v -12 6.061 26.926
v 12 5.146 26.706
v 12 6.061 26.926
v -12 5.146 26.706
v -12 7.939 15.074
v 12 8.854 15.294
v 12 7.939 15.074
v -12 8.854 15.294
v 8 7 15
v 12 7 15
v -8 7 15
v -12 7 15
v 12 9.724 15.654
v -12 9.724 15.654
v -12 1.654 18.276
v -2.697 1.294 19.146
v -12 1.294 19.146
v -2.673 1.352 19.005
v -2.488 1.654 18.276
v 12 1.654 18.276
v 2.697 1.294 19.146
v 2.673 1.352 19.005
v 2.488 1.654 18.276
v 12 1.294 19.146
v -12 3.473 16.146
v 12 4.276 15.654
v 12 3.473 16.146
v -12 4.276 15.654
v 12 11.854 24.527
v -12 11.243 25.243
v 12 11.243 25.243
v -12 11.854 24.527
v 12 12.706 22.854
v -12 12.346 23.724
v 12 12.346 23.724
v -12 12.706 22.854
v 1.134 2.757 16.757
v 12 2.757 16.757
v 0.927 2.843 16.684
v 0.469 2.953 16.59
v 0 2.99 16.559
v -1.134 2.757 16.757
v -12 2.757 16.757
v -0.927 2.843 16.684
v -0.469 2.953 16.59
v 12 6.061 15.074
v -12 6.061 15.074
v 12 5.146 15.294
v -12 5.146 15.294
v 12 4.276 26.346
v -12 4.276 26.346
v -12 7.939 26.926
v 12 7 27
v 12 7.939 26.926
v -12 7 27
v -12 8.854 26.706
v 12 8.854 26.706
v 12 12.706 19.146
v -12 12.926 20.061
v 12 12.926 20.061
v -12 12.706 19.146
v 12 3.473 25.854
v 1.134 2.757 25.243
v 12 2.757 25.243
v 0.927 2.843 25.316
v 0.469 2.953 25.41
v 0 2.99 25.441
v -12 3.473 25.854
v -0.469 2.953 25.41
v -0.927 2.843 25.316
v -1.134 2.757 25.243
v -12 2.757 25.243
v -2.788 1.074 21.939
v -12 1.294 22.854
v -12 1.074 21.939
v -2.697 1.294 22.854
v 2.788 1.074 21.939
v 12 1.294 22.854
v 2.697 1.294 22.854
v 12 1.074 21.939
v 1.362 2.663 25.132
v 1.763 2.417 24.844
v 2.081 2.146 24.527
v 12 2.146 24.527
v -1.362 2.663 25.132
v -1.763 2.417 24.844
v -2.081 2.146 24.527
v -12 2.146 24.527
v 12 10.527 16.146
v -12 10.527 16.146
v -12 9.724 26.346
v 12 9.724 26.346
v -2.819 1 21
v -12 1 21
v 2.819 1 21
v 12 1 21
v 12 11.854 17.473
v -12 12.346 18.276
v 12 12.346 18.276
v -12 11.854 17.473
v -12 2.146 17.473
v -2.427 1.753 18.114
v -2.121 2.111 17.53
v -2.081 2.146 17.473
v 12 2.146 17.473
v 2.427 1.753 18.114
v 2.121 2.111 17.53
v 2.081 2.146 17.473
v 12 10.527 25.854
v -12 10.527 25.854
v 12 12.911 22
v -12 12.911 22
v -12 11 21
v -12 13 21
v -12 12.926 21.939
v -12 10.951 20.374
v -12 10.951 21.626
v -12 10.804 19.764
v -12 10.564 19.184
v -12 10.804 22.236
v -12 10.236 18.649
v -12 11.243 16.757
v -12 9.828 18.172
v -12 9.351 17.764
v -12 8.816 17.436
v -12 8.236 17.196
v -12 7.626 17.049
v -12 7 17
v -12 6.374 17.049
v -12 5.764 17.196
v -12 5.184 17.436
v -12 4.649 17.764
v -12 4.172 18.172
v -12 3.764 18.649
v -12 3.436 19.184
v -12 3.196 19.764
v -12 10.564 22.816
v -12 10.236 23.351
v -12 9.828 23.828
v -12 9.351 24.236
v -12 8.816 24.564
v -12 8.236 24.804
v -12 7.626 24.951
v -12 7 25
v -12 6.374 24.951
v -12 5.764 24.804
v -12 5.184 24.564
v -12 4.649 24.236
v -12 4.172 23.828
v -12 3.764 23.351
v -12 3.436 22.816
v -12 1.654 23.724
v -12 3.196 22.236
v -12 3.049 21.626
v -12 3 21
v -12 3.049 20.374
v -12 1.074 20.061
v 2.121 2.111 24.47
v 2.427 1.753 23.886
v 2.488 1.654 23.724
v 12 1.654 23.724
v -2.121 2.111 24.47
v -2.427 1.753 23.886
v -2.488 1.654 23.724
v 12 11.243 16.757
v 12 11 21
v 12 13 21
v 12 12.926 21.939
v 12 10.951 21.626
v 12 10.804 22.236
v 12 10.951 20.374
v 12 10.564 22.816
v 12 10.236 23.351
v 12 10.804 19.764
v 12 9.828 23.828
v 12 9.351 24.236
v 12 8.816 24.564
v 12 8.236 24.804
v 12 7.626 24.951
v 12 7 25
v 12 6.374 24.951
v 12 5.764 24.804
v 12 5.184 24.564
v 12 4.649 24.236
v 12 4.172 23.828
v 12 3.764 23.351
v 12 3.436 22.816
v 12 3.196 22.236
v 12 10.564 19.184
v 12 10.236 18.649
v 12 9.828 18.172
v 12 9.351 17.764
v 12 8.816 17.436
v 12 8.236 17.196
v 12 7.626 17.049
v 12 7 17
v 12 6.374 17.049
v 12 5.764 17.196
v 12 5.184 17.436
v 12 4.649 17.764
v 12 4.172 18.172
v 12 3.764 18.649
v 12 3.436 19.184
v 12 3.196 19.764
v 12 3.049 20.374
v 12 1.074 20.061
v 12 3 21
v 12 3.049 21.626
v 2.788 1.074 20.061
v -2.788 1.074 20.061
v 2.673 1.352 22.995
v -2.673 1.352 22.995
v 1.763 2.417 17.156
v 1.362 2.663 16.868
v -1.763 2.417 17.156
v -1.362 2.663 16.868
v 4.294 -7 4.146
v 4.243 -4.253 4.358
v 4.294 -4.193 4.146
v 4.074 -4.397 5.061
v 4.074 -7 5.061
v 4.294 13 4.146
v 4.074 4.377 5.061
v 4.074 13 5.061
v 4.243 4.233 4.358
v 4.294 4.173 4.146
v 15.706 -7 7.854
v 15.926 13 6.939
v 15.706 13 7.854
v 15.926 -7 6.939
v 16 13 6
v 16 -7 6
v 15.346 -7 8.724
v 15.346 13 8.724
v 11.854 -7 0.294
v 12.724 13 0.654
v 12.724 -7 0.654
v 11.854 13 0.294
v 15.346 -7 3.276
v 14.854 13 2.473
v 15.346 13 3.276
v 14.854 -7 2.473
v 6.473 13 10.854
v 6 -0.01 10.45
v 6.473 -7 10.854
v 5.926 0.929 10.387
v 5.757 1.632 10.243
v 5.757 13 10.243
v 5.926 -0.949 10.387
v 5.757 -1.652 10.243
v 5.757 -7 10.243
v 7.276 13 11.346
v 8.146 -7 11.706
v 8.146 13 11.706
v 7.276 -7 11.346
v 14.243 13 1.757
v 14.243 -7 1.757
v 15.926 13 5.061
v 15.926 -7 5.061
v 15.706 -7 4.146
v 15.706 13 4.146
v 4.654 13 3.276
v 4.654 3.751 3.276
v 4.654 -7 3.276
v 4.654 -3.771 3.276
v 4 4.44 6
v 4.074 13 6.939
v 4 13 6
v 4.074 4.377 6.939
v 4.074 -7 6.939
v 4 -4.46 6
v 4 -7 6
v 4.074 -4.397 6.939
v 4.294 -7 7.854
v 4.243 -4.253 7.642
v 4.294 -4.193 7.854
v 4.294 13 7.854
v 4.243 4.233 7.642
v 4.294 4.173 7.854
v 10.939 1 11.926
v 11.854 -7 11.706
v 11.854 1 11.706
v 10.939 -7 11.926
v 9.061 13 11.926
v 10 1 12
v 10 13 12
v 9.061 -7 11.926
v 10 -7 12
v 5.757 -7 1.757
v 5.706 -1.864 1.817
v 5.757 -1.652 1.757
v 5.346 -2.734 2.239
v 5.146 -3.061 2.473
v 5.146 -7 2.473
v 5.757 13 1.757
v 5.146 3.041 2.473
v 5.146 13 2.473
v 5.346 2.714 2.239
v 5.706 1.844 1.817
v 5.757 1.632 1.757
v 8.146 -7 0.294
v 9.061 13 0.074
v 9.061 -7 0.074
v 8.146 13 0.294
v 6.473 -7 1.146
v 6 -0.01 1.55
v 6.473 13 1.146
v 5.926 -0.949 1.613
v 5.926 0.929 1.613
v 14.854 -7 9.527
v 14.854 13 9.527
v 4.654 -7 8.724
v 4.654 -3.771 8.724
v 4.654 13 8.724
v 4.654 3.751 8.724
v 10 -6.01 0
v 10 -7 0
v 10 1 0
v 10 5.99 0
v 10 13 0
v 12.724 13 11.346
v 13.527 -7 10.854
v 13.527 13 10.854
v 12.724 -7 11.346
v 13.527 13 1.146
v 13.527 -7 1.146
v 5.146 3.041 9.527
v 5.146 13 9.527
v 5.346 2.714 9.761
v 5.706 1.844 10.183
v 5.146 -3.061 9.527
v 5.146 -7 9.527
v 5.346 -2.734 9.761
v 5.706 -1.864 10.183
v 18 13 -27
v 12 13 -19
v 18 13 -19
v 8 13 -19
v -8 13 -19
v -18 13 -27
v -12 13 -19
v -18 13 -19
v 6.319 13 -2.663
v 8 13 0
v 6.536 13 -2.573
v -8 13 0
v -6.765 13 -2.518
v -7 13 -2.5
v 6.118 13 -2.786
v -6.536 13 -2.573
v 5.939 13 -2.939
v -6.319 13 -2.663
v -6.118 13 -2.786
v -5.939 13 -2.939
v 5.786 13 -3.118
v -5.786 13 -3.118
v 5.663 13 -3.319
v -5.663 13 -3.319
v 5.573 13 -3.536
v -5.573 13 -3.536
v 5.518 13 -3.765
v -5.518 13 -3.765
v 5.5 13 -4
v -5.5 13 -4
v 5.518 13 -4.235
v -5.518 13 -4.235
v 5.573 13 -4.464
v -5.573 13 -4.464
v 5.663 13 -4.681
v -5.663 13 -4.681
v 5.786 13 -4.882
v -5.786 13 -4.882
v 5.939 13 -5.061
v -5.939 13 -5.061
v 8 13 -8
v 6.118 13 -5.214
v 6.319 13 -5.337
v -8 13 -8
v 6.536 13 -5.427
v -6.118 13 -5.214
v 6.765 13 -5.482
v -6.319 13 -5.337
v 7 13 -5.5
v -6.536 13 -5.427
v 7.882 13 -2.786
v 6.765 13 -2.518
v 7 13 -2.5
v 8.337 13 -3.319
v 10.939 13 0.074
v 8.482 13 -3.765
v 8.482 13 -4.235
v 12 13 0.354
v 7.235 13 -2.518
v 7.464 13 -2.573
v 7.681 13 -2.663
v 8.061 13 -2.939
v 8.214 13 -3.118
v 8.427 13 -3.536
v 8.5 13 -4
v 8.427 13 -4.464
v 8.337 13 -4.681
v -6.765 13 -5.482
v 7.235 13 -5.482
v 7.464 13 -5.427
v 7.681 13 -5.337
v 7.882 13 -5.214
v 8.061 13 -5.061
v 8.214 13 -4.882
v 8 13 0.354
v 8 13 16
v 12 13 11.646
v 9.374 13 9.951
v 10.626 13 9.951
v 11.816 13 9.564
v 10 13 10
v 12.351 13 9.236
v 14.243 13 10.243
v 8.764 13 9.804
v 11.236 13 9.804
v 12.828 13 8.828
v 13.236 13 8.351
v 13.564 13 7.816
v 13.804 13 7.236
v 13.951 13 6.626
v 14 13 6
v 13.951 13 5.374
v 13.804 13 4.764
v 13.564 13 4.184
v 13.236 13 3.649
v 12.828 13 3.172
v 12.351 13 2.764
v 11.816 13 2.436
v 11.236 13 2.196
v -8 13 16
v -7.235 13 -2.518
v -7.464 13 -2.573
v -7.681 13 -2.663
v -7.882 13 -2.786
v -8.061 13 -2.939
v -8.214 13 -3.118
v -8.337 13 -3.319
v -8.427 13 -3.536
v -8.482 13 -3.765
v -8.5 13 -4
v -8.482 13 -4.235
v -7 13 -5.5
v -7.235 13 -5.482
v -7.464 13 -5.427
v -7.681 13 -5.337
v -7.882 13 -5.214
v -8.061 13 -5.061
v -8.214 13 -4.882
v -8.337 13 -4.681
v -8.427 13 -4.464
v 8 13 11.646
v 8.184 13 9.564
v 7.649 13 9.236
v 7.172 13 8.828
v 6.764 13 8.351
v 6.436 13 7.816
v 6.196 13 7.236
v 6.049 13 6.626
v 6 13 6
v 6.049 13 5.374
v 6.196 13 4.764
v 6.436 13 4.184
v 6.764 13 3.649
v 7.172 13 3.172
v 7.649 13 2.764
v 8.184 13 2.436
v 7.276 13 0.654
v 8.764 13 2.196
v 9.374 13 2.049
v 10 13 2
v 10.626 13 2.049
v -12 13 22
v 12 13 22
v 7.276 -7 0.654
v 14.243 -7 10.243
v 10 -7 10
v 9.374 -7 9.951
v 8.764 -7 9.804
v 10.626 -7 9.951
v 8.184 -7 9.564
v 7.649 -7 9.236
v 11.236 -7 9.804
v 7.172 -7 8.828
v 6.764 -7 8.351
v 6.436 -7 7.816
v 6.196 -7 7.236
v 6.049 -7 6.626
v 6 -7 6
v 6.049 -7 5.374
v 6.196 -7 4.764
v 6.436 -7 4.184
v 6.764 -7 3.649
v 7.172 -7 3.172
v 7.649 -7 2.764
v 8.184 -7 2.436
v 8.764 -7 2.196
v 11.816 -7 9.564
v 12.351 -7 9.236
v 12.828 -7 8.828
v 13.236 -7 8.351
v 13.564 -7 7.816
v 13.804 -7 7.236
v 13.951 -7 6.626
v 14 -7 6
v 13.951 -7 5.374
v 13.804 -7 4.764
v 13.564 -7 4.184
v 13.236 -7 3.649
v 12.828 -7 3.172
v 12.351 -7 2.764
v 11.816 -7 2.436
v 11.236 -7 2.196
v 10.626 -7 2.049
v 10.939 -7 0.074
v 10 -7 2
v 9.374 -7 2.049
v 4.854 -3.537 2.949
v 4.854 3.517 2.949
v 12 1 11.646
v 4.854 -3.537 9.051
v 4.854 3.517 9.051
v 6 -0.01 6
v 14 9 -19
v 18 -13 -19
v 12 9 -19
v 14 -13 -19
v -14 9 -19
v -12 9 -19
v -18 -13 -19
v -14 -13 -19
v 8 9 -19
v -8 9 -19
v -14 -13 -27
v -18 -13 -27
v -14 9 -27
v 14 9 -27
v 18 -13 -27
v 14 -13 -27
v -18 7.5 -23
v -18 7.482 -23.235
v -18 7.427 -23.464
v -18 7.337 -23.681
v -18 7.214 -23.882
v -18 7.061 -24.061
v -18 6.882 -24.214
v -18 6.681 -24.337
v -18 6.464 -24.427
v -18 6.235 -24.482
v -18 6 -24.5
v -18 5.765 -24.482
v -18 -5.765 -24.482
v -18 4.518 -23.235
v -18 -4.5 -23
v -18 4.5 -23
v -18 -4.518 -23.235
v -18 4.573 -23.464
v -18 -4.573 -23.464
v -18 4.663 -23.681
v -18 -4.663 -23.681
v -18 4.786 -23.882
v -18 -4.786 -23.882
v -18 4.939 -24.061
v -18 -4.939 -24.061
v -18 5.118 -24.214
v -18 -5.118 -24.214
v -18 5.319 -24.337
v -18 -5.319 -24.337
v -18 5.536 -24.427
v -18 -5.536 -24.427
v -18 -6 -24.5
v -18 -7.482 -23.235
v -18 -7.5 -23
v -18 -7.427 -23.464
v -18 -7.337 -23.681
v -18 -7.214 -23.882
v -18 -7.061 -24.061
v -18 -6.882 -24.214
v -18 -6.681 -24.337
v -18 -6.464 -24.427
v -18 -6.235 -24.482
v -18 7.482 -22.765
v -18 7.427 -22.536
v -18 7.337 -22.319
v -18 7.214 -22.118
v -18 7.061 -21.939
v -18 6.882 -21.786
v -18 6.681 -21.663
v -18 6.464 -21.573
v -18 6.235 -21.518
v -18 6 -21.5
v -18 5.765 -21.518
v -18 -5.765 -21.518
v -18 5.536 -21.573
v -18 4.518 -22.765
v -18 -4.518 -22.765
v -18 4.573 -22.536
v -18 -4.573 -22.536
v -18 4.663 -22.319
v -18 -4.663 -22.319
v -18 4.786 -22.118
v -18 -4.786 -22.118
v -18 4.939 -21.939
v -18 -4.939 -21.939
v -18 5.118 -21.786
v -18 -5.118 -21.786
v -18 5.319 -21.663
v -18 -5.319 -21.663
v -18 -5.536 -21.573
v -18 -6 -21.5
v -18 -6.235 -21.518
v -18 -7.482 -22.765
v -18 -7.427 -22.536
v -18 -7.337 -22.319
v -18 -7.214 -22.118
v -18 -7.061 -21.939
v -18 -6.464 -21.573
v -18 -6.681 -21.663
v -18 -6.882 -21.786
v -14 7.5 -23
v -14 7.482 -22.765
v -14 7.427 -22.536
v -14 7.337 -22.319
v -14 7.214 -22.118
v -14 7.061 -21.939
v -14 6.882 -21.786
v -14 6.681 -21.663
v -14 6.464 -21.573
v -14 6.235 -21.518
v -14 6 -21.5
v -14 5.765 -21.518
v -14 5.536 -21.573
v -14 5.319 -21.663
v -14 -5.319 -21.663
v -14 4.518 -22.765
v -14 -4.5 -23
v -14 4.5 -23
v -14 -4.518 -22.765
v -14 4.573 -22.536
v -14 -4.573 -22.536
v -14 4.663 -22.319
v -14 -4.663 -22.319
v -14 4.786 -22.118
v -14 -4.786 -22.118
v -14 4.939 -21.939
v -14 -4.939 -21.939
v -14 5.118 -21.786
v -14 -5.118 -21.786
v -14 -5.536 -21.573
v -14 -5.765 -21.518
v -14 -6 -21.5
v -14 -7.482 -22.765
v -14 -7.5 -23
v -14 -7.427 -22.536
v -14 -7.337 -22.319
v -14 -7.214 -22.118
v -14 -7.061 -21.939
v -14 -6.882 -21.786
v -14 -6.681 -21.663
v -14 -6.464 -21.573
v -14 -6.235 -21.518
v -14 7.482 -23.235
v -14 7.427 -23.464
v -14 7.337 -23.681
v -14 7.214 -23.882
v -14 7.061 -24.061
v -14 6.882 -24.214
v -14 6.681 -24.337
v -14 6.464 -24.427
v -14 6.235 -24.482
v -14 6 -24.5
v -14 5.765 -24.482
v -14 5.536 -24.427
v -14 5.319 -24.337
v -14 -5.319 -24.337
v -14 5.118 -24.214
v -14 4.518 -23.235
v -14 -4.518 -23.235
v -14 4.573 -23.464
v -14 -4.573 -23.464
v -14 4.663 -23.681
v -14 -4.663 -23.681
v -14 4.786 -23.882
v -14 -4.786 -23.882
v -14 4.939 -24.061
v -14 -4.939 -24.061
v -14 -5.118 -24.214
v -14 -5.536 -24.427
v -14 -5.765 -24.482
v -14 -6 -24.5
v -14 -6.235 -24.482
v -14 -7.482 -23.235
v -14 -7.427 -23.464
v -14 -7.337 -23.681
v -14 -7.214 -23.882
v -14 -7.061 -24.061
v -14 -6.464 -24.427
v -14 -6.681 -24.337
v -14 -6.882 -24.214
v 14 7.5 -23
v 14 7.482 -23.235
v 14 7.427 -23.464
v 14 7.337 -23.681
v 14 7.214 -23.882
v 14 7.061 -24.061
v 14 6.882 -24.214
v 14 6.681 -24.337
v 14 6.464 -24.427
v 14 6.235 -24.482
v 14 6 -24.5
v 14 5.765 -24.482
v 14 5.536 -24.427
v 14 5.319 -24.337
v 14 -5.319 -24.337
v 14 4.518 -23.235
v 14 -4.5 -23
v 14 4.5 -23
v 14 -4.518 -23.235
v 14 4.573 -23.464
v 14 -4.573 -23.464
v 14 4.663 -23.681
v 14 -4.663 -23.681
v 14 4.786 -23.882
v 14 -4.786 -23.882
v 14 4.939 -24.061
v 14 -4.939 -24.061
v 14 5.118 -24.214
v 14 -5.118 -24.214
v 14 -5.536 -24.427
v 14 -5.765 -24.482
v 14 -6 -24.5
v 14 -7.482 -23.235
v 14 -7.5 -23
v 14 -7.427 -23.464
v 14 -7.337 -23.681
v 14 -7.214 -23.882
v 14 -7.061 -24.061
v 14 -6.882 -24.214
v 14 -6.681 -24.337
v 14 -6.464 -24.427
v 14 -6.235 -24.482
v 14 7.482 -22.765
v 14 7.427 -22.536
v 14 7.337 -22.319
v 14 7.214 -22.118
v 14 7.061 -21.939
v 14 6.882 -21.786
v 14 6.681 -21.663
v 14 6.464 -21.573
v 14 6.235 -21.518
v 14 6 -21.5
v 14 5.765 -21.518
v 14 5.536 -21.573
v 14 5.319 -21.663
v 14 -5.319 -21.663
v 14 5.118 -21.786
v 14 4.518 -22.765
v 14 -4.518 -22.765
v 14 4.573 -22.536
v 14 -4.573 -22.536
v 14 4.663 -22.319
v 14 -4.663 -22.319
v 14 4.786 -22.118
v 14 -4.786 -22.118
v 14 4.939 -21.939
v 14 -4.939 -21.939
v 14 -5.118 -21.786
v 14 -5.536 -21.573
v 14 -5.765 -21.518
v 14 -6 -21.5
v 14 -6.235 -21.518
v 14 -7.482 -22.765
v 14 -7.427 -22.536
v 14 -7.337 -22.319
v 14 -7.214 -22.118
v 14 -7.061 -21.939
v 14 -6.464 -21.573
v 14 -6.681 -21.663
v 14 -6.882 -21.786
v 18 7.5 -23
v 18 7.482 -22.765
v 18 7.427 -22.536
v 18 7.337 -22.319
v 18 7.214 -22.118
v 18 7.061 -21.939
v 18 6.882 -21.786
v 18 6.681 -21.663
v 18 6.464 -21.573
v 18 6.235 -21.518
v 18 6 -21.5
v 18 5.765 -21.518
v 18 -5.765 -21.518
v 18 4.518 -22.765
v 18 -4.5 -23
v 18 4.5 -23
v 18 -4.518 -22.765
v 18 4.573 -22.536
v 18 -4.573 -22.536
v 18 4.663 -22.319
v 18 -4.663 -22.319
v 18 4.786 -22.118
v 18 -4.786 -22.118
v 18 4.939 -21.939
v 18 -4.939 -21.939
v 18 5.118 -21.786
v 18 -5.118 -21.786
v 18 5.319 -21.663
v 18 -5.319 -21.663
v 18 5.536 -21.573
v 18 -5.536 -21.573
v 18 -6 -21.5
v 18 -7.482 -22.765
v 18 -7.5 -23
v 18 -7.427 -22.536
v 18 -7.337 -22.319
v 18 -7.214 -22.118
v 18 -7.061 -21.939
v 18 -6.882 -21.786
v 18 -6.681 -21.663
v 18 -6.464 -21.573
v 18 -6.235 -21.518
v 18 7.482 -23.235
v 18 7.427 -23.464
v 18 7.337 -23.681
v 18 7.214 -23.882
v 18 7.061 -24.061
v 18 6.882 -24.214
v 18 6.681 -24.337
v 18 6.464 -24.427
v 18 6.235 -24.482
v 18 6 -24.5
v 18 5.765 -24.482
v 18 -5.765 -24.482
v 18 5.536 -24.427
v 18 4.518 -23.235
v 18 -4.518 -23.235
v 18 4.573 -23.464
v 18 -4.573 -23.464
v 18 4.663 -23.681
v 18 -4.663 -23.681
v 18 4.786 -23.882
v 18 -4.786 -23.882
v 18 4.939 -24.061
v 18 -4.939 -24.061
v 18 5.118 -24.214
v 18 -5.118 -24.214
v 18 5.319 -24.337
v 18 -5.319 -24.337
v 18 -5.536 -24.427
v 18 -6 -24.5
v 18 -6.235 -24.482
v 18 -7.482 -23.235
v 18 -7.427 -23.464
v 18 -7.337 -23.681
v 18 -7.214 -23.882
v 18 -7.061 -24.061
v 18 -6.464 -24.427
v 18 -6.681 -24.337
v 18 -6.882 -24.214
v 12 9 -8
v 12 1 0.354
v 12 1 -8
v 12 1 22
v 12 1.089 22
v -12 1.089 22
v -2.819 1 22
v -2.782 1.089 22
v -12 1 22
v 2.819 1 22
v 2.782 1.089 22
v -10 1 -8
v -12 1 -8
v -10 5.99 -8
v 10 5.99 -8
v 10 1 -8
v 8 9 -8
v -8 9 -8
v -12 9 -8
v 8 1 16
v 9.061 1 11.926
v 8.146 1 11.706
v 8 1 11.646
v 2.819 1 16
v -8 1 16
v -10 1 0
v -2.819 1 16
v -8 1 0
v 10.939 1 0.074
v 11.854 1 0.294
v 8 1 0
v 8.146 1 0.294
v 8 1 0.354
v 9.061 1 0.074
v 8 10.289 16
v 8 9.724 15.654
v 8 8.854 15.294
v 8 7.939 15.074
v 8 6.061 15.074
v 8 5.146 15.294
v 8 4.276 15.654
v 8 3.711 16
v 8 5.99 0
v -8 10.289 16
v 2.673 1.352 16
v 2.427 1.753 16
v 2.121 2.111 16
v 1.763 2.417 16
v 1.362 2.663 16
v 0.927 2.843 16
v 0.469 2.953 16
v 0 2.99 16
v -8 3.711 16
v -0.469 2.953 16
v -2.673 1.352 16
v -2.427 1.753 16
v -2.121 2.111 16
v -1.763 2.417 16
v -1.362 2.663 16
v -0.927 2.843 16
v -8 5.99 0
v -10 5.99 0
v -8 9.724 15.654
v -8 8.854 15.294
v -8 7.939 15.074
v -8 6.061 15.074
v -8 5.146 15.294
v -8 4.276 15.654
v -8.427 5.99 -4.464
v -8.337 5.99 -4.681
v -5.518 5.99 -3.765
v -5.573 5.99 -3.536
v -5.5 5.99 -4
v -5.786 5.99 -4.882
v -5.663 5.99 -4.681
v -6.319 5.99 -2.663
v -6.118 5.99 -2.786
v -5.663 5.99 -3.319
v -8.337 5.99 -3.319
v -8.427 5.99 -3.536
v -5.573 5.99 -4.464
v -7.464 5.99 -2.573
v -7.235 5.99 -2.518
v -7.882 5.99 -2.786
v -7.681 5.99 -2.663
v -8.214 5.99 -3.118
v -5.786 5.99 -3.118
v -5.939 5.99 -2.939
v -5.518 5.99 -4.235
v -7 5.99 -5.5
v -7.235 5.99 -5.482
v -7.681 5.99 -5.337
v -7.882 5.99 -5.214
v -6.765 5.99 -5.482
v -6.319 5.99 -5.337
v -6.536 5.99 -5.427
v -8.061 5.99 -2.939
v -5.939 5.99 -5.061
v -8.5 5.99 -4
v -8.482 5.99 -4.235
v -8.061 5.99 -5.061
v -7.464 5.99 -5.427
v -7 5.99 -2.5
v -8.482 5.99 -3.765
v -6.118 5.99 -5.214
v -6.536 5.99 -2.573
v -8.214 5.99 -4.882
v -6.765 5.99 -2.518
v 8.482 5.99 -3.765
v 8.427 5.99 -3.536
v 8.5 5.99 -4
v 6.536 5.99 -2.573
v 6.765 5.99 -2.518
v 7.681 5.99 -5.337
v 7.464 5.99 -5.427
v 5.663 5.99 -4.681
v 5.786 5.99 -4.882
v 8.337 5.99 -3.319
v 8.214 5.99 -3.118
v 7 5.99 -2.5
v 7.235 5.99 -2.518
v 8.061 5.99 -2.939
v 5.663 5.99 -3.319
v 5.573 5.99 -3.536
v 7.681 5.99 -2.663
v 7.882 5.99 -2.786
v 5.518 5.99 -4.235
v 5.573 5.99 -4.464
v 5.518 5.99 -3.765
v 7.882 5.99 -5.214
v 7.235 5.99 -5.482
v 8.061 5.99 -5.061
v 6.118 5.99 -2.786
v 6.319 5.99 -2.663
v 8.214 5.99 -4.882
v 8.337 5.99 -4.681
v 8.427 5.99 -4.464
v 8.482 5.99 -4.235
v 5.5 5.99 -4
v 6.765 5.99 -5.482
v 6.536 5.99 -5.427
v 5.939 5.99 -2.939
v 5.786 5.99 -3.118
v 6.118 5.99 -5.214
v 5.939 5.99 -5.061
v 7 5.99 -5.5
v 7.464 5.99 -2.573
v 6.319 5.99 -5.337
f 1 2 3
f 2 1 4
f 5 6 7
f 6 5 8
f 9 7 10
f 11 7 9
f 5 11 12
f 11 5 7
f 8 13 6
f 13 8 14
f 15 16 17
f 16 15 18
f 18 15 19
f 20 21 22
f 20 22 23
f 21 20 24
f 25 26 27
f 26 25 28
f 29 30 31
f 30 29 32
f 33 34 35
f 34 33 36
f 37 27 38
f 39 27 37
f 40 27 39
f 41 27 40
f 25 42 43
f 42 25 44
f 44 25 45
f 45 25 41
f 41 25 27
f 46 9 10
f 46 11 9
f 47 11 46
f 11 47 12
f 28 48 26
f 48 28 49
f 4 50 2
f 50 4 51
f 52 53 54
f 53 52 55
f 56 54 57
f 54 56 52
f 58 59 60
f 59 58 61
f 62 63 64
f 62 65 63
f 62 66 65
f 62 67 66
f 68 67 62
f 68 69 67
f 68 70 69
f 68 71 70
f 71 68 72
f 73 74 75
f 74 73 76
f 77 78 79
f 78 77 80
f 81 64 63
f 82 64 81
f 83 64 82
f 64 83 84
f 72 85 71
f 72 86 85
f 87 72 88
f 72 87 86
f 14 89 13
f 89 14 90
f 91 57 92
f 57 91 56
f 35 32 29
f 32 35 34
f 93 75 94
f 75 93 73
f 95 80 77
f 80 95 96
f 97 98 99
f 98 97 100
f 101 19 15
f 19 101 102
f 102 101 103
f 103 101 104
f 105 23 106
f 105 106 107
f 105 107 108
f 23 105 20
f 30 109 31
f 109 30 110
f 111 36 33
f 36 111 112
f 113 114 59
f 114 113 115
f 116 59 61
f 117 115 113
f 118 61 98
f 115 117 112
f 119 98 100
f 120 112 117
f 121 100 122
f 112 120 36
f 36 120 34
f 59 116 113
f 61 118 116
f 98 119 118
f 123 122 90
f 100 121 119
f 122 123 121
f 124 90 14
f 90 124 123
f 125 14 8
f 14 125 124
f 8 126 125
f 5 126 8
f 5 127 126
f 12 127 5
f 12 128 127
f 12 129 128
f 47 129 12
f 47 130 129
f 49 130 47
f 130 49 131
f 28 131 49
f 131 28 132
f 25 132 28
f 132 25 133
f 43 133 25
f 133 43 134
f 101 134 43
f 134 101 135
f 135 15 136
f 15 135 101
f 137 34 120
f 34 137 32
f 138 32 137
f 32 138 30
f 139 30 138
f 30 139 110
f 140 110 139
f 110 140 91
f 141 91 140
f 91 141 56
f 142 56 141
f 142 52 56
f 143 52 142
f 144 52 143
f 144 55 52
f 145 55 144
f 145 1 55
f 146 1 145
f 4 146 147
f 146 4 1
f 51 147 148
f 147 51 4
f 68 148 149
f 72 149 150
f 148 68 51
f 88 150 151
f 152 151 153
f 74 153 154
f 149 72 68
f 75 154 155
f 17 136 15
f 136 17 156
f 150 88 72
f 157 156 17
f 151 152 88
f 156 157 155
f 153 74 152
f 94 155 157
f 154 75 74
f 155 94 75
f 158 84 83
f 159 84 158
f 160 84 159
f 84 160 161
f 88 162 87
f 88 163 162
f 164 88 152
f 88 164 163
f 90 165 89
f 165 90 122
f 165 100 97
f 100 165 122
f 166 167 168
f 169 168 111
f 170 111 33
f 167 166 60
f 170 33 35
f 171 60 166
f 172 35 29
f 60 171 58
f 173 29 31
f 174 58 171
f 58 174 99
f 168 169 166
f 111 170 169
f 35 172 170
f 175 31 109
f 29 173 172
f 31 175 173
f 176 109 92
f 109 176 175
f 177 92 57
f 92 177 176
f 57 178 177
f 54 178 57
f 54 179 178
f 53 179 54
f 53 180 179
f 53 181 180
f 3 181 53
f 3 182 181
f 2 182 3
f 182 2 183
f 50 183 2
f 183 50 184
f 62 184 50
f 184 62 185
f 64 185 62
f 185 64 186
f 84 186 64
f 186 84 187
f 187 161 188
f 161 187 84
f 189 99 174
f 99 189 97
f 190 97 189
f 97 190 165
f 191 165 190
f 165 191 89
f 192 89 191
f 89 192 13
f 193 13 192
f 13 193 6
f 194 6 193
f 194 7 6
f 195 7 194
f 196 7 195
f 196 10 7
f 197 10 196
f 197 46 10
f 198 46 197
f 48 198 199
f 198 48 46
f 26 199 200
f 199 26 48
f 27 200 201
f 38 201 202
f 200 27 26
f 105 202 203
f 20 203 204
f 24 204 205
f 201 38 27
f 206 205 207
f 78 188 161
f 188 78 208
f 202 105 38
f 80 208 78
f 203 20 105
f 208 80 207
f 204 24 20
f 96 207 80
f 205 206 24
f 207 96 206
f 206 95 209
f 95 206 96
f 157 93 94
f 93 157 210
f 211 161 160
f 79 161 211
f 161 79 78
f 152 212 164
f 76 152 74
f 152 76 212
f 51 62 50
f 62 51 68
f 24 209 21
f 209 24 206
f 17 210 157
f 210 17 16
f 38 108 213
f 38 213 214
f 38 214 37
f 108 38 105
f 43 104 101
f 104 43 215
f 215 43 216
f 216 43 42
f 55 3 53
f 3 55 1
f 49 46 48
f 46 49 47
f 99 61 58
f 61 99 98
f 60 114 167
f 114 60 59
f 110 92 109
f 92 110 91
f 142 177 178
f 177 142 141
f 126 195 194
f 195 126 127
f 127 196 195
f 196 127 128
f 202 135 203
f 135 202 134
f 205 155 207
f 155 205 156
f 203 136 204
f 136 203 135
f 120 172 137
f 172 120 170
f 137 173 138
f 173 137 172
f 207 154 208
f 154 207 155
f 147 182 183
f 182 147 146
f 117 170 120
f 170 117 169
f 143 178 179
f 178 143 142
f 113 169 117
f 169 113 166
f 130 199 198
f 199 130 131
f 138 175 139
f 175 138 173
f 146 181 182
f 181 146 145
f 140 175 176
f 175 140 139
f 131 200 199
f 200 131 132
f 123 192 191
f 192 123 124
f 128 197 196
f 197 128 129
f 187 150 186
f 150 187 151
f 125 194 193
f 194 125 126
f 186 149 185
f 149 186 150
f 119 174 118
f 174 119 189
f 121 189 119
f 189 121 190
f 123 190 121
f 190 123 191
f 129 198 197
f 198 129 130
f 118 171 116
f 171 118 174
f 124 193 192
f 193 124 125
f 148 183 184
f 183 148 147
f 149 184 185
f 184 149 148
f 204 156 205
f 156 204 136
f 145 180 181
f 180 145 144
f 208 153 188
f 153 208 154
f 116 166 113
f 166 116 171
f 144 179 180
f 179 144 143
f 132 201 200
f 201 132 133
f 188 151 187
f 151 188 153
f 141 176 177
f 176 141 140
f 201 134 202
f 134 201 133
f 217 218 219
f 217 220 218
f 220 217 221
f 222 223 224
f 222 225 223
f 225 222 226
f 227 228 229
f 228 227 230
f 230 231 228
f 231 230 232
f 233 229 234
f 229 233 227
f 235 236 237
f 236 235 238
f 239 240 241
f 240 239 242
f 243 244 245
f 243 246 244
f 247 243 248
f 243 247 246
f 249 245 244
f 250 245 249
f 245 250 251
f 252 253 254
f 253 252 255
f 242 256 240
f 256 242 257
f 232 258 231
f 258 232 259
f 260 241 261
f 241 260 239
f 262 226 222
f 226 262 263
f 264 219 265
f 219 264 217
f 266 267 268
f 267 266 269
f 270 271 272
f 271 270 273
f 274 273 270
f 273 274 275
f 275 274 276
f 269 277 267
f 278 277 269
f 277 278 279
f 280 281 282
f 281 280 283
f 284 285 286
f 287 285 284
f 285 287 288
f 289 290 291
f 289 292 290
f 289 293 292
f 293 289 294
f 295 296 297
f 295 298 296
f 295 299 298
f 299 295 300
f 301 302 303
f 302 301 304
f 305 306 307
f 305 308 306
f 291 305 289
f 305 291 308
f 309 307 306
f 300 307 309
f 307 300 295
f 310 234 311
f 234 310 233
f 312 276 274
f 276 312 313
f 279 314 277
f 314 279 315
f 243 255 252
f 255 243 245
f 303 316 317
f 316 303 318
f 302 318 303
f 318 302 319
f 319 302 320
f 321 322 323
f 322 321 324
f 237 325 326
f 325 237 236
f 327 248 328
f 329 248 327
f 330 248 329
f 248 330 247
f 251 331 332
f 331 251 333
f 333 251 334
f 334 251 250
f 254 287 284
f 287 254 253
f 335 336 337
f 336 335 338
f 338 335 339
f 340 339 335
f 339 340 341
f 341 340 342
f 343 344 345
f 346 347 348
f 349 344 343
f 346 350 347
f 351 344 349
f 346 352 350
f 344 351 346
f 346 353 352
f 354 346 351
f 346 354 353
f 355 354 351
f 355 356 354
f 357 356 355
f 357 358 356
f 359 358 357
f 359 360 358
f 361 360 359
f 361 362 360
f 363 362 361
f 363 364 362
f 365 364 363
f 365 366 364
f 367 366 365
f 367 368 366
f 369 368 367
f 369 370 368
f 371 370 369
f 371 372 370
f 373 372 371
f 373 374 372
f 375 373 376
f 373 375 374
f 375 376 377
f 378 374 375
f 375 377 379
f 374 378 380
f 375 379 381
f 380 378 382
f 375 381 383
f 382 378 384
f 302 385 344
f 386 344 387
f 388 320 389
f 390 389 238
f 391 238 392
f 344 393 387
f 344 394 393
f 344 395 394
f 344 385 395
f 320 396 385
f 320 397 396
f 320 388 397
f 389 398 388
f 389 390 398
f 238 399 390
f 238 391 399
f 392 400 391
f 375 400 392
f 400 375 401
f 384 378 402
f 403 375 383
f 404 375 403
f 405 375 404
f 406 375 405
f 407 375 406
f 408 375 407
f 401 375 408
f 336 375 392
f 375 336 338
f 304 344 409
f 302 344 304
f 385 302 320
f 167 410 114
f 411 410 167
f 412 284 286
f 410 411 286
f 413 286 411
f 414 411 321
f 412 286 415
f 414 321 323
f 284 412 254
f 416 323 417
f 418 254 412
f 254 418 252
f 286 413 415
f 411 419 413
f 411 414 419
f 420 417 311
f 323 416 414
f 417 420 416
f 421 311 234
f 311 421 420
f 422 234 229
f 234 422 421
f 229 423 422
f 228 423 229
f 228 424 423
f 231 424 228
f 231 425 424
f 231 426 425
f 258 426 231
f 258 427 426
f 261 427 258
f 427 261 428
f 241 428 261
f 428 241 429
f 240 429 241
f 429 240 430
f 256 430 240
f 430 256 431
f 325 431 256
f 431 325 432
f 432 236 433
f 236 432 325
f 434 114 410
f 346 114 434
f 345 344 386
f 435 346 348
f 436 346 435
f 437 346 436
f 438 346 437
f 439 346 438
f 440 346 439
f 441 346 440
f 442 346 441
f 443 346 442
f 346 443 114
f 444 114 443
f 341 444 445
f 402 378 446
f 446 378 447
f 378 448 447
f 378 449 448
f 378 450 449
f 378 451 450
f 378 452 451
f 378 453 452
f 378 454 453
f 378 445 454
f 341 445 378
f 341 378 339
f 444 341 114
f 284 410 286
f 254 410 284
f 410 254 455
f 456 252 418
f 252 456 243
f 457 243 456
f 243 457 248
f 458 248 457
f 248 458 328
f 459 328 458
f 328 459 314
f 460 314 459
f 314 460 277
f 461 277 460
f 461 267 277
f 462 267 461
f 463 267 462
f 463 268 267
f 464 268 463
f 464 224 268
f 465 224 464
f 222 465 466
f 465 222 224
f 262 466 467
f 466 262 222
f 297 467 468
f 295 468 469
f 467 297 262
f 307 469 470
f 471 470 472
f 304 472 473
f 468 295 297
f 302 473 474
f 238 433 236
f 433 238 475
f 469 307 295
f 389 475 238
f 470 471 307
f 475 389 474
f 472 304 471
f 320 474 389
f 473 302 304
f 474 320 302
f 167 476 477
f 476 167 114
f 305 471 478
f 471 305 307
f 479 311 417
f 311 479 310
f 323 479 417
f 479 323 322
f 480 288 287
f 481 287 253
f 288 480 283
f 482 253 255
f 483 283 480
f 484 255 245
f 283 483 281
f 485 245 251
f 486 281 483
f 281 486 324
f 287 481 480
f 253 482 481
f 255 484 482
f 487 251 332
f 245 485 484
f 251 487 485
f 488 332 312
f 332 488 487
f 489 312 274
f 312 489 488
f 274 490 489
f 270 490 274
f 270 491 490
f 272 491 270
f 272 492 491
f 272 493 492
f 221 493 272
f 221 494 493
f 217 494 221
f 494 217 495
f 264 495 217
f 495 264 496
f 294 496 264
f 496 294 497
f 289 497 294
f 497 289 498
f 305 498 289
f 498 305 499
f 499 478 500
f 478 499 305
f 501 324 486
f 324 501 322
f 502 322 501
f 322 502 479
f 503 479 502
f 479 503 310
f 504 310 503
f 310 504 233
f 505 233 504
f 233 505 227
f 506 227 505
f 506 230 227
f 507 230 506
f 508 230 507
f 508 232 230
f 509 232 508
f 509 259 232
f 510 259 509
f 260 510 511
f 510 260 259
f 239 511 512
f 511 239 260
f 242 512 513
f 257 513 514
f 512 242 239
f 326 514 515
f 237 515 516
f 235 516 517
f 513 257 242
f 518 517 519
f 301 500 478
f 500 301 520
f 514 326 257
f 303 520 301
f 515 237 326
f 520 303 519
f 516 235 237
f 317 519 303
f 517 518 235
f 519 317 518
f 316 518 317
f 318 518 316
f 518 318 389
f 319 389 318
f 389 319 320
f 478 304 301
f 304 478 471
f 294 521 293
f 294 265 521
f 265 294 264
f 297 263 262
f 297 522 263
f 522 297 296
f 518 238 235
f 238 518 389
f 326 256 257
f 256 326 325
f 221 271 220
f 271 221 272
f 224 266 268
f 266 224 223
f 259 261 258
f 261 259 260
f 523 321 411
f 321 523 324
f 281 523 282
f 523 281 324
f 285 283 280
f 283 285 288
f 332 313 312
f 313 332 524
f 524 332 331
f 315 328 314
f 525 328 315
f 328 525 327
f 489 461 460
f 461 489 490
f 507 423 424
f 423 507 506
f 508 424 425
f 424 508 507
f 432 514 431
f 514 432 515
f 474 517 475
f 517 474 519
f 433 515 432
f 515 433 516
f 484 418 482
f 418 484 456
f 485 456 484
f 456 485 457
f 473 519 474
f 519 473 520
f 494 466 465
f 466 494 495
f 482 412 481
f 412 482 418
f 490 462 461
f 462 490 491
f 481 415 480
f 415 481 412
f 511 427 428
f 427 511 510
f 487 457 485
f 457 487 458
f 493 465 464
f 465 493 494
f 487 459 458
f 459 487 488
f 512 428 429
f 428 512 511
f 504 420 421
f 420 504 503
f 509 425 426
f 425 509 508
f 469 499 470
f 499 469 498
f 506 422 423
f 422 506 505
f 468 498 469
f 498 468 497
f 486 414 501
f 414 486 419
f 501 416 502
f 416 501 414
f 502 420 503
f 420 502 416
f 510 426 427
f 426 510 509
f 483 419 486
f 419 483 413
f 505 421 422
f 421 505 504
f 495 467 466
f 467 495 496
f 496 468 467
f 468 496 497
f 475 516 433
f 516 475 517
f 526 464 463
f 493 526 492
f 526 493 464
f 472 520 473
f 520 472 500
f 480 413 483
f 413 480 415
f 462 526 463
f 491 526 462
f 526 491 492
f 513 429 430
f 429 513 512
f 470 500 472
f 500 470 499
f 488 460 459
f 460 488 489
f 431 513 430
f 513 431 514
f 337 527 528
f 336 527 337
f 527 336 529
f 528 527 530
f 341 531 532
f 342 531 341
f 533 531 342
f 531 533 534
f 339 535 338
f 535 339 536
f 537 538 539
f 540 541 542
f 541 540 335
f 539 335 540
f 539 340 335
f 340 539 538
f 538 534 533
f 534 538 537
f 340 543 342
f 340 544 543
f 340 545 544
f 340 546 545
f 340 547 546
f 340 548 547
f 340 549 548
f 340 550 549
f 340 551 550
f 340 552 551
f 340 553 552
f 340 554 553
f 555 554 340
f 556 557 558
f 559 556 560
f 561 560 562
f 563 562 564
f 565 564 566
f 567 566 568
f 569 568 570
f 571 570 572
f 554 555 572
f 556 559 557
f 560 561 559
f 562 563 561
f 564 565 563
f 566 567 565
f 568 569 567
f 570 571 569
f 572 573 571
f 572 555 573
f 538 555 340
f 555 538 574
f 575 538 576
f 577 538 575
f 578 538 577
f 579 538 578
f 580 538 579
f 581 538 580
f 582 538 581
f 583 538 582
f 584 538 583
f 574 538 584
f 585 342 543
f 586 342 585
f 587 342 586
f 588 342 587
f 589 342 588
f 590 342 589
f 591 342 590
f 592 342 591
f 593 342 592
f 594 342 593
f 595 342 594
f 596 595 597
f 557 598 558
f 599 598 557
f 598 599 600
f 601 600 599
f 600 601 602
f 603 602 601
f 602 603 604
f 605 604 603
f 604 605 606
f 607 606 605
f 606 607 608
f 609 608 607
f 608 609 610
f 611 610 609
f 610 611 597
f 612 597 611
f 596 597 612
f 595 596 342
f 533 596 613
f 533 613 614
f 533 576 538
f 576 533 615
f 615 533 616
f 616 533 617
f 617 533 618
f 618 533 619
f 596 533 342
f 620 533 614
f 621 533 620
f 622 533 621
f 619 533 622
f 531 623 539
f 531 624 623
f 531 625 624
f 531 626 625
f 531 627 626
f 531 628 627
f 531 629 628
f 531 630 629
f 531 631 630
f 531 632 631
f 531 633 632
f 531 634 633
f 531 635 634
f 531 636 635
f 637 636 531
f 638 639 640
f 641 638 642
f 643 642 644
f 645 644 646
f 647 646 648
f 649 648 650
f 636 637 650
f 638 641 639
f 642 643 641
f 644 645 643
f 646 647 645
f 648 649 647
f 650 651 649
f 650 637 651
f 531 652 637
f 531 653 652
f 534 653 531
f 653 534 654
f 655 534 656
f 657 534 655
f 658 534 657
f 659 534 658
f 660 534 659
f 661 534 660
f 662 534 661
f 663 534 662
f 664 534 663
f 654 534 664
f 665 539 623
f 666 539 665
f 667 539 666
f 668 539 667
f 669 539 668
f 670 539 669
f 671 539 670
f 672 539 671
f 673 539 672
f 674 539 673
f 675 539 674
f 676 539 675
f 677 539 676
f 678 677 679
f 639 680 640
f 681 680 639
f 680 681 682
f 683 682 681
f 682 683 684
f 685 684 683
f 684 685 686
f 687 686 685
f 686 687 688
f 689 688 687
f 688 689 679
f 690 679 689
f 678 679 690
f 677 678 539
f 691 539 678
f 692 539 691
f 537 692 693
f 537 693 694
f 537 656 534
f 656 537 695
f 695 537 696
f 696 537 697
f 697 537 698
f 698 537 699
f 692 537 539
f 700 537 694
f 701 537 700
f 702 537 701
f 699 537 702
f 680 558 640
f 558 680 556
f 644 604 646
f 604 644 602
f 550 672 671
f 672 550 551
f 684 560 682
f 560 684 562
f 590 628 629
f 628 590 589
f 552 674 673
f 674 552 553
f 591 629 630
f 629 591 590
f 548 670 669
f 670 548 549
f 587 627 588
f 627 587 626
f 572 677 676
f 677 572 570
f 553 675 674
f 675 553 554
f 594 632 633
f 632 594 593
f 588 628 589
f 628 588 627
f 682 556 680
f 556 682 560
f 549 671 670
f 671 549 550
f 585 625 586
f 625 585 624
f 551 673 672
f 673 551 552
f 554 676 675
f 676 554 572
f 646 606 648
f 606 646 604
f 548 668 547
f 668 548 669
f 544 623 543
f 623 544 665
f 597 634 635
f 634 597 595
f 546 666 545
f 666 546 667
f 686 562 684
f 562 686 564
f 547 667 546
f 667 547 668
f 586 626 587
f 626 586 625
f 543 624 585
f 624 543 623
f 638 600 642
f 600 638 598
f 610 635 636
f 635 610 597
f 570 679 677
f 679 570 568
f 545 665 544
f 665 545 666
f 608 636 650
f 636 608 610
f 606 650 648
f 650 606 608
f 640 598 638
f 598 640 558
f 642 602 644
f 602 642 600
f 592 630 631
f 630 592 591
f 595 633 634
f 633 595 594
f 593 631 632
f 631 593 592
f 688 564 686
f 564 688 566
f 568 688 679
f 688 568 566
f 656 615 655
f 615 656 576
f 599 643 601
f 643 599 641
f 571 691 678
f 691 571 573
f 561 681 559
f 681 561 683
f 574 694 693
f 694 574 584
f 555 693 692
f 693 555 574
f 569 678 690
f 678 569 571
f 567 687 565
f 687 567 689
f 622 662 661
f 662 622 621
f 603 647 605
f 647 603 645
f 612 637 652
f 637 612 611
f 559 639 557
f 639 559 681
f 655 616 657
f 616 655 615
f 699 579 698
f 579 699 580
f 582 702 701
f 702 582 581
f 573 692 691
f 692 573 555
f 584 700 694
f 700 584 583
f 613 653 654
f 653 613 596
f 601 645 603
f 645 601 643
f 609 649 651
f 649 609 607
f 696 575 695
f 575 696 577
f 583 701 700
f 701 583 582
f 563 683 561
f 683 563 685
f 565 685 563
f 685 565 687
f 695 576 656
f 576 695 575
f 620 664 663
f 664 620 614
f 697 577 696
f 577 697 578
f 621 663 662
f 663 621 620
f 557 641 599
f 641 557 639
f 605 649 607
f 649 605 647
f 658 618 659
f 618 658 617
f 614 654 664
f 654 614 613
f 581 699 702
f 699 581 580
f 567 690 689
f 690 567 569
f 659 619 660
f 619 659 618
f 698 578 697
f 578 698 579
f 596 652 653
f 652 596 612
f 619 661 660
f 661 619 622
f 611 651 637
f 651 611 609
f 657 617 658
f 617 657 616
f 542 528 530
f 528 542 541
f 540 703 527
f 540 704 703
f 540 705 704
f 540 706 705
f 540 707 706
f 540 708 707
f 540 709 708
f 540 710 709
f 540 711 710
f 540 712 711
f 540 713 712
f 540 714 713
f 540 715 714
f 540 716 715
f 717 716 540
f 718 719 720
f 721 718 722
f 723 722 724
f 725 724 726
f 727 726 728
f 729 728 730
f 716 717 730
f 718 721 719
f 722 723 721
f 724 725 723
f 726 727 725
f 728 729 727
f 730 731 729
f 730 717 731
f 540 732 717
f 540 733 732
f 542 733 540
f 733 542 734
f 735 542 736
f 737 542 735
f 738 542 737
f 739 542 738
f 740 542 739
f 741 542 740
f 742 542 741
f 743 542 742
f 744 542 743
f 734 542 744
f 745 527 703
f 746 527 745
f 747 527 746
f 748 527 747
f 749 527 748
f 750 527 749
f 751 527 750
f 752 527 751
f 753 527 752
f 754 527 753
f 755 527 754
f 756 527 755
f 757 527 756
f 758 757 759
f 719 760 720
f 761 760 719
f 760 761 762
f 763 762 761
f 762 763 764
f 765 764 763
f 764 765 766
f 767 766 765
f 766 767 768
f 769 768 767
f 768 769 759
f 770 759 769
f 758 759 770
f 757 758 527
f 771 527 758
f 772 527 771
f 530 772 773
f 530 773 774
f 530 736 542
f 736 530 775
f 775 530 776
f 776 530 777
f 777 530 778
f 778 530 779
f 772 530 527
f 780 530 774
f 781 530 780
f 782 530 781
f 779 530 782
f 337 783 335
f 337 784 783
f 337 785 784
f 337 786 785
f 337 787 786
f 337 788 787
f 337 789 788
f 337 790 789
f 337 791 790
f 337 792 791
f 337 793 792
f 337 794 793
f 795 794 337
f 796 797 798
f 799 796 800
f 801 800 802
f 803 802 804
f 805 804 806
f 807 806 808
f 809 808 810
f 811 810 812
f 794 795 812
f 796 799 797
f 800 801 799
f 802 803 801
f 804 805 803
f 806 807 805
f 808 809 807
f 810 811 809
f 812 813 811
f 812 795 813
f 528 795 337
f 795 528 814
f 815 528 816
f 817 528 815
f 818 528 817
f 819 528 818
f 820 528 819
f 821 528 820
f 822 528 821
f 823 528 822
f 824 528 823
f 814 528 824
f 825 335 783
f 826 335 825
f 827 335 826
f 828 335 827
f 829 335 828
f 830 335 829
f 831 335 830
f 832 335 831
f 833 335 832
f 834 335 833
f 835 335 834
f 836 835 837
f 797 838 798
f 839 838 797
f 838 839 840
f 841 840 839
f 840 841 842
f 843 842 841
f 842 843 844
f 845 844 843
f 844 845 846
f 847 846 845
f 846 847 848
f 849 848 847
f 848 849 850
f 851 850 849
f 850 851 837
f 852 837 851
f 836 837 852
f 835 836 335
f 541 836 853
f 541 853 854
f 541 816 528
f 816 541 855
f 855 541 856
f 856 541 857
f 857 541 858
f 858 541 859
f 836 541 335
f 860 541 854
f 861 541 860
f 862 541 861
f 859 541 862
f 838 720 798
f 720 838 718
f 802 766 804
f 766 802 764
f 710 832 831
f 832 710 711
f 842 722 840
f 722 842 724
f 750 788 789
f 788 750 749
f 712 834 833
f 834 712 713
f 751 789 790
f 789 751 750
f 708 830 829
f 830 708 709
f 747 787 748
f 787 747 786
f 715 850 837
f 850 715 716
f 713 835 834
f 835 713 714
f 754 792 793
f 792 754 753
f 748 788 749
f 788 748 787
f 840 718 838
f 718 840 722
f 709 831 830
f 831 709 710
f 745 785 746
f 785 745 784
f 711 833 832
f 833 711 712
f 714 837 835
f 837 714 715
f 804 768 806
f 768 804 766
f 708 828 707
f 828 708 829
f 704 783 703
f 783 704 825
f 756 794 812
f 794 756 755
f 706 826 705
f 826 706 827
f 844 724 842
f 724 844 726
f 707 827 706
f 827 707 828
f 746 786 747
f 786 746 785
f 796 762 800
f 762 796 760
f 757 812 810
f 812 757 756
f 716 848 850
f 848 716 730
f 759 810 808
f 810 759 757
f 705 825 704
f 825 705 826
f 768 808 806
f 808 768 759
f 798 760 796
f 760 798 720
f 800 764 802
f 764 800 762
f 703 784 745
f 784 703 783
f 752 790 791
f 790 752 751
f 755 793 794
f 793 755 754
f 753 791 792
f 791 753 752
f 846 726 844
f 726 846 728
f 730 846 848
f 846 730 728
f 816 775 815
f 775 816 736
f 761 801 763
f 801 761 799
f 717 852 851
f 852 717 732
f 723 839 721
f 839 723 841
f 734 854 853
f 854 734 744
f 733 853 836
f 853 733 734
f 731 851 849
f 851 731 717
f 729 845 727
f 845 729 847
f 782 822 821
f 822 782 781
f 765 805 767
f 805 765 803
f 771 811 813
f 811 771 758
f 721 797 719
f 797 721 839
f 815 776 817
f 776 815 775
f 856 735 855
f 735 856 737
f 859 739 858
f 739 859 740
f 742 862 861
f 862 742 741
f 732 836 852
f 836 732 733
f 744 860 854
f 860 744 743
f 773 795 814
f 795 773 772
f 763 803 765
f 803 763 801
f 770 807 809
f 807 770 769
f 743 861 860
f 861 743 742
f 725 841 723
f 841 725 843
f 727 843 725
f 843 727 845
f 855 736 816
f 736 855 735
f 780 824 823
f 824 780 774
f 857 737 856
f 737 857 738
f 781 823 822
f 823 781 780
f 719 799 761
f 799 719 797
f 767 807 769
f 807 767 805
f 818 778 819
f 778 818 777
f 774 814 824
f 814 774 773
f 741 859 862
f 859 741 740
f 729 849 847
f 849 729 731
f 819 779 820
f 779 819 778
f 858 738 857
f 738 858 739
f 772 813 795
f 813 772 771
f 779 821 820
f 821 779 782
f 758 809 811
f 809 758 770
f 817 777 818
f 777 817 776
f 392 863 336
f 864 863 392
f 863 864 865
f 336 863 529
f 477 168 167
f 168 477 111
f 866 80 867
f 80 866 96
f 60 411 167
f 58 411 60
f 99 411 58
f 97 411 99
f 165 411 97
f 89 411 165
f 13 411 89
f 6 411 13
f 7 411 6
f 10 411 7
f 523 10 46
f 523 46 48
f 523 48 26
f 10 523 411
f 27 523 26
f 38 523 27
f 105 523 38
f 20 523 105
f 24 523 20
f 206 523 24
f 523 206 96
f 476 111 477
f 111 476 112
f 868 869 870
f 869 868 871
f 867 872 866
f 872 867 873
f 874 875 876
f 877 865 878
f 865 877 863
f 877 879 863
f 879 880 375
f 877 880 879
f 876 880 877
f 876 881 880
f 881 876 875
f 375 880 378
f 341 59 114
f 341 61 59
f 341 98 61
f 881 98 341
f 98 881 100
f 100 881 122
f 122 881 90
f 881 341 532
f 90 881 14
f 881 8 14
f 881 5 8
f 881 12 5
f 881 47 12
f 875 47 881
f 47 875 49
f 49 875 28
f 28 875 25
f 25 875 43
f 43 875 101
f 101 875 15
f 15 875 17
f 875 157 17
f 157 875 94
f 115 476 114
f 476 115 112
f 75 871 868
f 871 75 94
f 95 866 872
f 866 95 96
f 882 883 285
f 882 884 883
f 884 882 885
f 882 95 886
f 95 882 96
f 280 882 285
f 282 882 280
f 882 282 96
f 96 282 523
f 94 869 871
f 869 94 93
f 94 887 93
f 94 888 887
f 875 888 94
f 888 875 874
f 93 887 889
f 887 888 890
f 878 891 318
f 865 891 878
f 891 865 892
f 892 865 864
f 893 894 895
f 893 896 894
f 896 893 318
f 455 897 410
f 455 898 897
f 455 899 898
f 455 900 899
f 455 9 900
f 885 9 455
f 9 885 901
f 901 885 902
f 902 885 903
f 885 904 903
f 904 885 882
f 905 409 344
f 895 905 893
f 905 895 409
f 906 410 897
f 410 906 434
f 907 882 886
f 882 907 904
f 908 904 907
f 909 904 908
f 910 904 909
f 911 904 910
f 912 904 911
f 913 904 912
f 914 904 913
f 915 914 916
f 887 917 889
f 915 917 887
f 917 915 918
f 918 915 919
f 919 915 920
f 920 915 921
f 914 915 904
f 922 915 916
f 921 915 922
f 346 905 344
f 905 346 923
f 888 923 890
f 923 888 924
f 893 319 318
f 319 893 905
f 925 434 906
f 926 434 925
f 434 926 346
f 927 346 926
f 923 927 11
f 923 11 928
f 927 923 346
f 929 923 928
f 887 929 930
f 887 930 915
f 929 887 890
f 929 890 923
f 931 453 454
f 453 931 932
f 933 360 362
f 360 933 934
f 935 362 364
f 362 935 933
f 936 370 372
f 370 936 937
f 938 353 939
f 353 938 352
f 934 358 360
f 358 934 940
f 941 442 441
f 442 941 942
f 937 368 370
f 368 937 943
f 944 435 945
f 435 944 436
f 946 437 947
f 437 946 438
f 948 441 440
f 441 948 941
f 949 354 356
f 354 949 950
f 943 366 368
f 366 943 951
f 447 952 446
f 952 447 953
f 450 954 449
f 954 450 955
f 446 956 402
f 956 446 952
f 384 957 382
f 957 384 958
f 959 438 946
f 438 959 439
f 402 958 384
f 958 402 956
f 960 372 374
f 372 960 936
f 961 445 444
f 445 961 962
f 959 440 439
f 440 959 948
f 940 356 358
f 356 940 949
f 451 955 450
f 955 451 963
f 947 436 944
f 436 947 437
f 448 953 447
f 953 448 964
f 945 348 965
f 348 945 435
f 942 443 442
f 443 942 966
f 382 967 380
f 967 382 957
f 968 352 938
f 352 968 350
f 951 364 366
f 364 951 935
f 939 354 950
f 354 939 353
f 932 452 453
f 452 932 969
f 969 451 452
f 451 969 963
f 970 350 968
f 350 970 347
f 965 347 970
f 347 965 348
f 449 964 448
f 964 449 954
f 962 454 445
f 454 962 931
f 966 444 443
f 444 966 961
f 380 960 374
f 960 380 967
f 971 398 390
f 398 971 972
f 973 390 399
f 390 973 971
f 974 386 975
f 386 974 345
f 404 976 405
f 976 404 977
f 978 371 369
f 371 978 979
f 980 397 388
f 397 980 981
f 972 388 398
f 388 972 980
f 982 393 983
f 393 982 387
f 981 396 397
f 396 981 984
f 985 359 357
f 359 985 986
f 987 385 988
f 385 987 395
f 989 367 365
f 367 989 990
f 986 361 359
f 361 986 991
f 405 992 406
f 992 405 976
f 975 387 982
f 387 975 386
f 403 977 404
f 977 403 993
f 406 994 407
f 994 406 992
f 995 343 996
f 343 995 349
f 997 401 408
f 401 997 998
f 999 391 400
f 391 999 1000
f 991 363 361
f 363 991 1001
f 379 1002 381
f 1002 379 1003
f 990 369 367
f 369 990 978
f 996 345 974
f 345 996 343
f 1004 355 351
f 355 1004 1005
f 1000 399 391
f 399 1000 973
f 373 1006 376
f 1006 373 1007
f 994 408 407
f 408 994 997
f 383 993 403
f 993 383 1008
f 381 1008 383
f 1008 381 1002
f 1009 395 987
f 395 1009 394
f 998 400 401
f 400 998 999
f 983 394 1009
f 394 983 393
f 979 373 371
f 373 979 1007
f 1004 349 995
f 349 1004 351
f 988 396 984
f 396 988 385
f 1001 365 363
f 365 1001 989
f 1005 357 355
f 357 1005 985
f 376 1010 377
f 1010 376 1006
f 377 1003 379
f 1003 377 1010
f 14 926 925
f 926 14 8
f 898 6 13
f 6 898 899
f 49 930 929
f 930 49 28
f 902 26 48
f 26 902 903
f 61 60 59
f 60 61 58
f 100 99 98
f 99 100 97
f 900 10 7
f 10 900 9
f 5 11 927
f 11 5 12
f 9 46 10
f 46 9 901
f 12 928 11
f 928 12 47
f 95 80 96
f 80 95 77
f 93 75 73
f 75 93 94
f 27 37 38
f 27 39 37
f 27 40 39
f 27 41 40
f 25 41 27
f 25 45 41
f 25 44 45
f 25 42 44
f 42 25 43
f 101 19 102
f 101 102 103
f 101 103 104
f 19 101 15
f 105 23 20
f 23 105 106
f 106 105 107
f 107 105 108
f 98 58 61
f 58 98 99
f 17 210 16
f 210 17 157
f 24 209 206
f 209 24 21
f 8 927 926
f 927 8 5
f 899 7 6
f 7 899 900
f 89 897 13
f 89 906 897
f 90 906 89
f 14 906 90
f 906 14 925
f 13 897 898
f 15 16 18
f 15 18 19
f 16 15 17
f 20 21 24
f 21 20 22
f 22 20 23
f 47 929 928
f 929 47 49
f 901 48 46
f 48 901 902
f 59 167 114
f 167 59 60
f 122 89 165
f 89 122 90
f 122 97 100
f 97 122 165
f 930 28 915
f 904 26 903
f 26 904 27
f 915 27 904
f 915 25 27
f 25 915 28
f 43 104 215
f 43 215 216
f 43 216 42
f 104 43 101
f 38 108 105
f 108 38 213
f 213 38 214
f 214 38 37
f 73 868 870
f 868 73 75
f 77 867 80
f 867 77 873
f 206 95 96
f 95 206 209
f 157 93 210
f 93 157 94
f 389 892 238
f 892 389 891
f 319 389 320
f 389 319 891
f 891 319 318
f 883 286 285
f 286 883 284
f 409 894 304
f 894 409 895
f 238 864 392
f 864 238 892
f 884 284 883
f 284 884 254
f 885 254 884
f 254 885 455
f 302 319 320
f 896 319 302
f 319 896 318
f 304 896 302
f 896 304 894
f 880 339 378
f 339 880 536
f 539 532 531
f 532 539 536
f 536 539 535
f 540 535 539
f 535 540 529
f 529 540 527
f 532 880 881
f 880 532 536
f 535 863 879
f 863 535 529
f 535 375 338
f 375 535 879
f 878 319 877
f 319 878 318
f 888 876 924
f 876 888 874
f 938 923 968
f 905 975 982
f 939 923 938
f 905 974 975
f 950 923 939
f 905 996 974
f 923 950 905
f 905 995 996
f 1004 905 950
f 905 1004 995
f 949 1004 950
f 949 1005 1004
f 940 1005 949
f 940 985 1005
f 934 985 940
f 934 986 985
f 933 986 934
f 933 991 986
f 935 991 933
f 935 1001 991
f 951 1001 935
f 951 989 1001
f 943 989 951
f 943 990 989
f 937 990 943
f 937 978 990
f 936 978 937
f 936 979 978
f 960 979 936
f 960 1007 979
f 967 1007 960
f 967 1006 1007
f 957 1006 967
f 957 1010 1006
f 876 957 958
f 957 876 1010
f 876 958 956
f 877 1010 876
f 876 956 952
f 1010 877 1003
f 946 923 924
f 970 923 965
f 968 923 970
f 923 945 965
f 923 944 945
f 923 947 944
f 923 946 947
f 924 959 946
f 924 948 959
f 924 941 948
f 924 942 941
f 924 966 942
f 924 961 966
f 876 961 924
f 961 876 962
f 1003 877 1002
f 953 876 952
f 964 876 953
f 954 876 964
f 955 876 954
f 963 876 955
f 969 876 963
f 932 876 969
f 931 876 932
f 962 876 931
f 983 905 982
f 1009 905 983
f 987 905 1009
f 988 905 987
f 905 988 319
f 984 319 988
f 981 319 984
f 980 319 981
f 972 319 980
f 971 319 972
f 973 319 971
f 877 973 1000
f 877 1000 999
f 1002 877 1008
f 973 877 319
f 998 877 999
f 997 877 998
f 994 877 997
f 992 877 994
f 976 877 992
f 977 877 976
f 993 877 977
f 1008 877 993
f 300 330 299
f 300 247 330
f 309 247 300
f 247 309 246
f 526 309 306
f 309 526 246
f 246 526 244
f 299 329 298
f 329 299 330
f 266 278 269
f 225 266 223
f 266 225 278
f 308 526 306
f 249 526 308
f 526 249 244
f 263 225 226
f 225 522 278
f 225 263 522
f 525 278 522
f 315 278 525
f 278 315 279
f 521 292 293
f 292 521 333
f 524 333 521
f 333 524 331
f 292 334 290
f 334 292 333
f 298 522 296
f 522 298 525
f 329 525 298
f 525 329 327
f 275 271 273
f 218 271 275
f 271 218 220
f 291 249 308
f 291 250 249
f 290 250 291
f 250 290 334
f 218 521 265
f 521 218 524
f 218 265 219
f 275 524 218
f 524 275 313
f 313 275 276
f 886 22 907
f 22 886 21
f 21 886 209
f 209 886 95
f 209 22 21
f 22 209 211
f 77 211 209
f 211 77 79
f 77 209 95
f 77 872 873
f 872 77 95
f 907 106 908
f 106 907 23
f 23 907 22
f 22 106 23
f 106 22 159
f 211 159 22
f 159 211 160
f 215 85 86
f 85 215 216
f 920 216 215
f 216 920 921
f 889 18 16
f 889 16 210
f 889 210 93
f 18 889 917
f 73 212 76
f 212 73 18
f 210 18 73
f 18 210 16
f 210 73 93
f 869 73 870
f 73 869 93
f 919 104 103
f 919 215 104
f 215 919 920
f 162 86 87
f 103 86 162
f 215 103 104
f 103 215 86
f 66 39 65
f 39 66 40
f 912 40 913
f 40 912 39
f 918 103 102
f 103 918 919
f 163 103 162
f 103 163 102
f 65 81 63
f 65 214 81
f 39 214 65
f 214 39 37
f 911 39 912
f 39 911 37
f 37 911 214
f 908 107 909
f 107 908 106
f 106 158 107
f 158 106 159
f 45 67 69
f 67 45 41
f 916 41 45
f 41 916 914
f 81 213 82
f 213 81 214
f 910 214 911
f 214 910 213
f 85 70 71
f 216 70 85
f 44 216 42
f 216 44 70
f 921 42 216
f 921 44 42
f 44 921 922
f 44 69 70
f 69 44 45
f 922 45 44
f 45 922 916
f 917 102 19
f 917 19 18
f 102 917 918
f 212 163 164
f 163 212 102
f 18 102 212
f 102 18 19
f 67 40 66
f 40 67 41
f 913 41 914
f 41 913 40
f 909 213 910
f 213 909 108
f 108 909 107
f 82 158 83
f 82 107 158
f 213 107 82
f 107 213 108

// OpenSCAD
// hotend CR10
$fn = 40;
SLEEVE_L = 20;
SLEEVE_D0 = 6;
SLEEVE_D1 = 8;
SLEEVE_WALL = 2;

module UMSleeveHolder(){
    difference(){
       cylinder(h = SLEEVE_L, d = SLEEVE_D1 + 2*SLEEVE_WALL, center=true);
       scale([1,1,1.01])cylinder(h = SLEEVE_L, d = SLEEVE_D1, center=true);
       
    }
    % difference(){
       cylinder(h = SLEEVE_L, d = SLEEVE_D1, center=true);
       scale([1,1,1.01])cylinder(h = SLEEVE_L, d = SLEEVE_D0, center=true);
    }
    % cylinder(h = SLEEVE_L*10, d = SLEEVE_D0, center=true);
}

module UMSleeveHull(){
    scale([1,1,1.01]) cylinder(h = SLEEVE_L, d = SLEEVE_D1 + 2*SLEEVE_WALL, center=true);
}

module UMHotend(){
    union(){
        translate([0,7,21]) rotate ([0,90,0]) scale([1,1,1.2]) UMSleeveHolder();
        translate([10,3,6]) rotate ([90,0,0]) UMSleeveHolder();
        
        translate([-12,9,-26]) cube([4,4,20]);
        translate([8,9,-26]) cube([4,4,20]);
        
        translate([-16,9,-19]) rotate ([0, 90, 0]) cube([8,4,32]);
        
        difference(){
            translate([-18,13,-19]) rotate ([90, 90, 0]) cube([8,4,26]);
            translate([-16, 6,-23]) rotate ([0, 90, 0]) scale([1,1,1.01]) cylinder(h = 4, d = 3, center=true);
            translate([-16, -6,-23]) rotate ([0, 90, 0]) scale([1,1,1.01]) cylinder(h = 4, d = 3, center=true);
        }
        difference(){
            translate([14,13,-19]) rotate ([90, 90, 0]) cube([8,4,26]);
            translate([16, 6,-23]) rotate ([0, 90, 0]) scale([1,1,1.01]) cylinder(h = 4, d = 3, center=true);
            translate([16, -6,-23]) rotate ([0, 90, 0]) scale([1,1,1.01]) cylinder(h = 4, d = 3, center=true);
        }
        difference(){
            translate([-12,1,-8]) cube([24,12,30]);
            translate([-8,0,0]) cube([16,14,16]);
            translate([-7, 7, -4]) rotate([90,0,0]) scale([1,1,1.01]) cylinder(h = 12, d = 3, center=true);
            translate([7, 7, -4]) rotate([90,0,0]) scale([1,1,1.01]) cylinder(h = 12, d = 3, center=true);
            translate([0,7,21]) rotate ([0,90,0]) scale([1,1,1.2]) UMSleeveHull();
            translate([10,3,6]) rotate ([90,0,0]) UMSleeveHull(); 
        }
    }
}

module UMCR10(){
    union(){
        difference(){
            cube([20,12,27], center = false);
            translate([3, 6, 23]) rotate([90,0,0]) scale([1,1,1.01]) cylinder(h = 12, d = 2.9, center=true);
            translate([17, 6, 23]) rotate([90,0,0]) scale([1,1,1.01]) cylinder(h = 12, d = 2.9, center=true);
        }
        difference(){
            translate([0, -10, 5]) cube([20,10,20], center = false);
            translate([3, -5, 23]) rotate([90,0,0])scale([1,1,1.01]) cylinder(h = 10, d = 2.9, center=true);
            translate([17, -5, 23]) rotate([90,0,0])scale([1,1,1.01]) cylinder(h = 10, d = 2.9, center=true);
        }
        translate([0, -8, -16]) cube([20,20,12], center = false);
        translate([10, 6, -11]) cylinder(h = 22, d = 8, center=true);
       
        translate([10, 6, 34]) cylinder(h = 14, d = 12, center=true);
        translate([10, 6, 48]) cylinder(h = 14, d = 6, center=true);
    }
}

% translate([-10,-6,-27]) UMCR10();
difference(){
    UMHotend();
    translate([-10,-6.01,-27]) UMCR10();
}

module UMCoolingPart(){
    difference (){
        union(){
            translate ([0, 0, 0.5]) cube([80, 30, 1], center = true);
            translate ([-19, -15, 0.5]) cube([1, 30, 20], center = false);    
        }    
        translate ([0, 0, 0.5]) cylinder(h = 2, d=20, center = true);
    }
    
}
//translate ([0, 0, -48]) UMCoolingPart();
module UME3DFan(){
    intersection(){
        #import("e3d fan.stl");        
        translate ([-15, 0, 19.5]) cube([40, 40, 40]);
    }
    //% translate ([-15, 0, 19.5]) cube([40, 40, 40]);
}

//UME3DFan();
